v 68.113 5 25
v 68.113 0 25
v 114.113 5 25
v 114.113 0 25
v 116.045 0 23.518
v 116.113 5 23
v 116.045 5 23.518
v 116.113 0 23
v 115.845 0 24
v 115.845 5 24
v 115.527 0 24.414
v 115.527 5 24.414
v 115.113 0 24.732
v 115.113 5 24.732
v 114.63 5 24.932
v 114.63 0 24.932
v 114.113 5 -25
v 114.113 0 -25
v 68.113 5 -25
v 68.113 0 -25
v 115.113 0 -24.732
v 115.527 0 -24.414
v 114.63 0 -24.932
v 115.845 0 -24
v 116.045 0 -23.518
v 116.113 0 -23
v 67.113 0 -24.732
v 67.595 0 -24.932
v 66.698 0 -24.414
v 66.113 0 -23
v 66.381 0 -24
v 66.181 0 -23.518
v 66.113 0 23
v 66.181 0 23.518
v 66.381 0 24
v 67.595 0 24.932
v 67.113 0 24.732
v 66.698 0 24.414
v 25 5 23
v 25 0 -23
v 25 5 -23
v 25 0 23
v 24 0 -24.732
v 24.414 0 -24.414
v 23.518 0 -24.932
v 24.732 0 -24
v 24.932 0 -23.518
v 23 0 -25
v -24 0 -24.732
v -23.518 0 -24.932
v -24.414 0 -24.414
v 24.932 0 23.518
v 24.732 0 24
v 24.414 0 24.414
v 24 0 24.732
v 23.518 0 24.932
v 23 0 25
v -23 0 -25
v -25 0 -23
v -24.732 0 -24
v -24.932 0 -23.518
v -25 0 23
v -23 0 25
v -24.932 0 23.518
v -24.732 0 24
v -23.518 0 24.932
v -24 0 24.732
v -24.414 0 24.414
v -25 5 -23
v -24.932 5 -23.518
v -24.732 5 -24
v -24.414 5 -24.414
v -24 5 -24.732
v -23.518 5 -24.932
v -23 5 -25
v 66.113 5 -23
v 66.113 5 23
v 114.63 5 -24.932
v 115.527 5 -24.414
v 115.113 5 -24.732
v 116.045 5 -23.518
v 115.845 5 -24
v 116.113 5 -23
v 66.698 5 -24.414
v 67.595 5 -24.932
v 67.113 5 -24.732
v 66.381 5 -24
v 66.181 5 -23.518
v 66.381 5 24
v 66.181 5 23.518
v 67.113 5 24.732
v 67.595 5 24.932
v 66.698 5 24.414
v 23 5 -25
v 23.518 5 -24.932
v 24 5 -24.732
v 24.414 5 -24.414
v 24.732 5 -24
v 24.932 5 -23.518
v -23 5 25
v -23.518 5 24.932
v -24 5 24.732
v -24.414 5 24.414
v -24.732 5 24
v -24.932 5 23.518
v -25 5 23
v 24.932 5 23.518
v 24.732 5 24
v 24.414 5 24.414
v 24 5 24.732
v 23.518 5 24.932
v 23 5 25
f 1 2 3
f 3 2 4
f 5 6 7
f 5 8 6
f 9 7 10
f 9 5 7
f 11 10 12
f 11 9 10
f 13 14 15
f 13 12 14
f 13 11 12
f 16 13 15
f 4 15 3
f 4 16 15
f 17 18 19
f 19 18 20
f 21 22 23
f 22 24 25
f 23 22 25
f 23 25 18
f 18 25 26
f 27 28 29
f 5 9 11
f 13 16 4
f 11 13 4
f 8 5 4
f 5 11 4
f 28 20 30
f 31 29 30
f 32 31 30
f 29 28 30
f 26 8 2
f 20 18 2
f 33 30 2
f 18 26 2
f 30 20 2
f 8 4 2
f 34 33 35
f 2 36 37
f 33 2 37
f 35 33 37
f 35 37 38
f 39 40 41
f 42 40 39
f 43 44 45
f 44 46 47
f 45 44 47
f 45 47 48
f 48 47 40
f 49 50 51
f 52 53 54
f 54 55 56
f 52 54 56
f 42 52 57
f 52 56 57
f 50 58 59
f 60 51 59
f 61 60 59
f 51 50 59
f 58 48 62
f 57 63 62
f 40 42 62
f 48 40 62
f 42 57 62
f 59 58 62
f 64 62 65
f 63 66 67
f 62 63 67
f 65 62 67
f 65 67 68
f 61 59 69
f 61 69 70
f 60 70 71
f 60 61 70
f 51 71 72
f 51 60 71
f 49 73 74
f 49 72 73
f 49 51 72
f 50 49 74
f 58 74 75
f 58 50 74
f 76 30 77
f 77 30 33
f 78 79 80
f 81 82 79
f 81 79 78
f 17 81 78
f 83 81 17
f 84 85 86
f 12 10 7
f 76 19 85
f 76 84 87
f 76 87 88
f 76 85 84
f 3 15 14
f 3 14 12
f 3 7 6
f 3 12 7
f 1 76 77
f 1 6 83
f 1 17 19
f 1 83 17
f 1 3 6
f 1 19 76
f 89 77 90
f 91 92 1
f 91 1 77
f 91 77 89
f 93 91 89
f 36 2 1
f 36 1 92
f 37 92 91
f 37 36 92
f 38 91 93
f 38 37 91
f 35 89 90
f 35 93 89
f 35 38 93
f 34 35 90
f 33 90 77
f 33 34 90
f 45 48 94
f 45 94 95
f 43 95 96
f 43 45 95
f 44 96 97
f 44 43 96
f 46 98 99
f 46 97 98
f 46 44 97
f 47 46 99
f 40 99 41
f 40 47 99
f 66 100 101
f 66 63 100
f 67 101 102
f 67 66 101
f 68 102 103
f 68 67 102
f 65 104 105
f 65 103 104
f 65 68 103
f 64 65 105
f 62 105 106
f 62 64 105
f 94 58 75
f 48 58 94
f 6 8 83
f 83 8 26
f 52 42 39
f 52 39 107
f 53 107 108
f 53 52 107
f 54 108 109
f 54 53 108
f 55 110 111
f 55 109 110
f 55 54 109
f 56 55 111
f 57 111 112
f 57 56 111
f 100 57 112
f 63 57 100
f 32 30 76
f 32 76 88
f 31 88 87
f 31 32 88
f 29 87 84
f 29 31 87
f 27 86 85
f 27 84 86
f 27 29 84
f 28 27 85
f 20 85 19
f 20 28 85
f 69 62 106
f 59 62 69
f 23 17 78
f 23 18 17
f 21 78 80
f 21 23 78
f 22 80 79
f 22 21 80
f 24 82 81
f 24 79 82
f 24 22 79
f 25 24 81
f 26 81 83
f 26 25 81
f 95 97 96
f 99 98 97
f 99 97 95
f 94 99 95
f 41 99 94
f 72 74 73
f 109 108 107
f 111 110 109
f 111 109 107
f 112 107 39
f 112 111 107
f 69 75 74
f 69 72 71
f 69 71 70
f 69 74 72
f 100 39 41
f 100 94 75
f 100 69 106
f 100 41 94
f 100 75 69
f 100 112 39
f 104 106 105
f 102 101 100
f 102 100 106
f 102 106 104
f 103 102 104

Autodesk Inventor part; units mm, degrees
ref_plane "YZ Plane" through (0, 0, 0) normal (1, 0, 0) x (0, 1, 0)
ref_plane "XZ Plane" through (0, 0, 0) normal (0, 1, 0) x (-1, 0, 0)
ref_plane "XY Plane" through (0, 0, 0) normal (0, 0, 1) x (1, 0, 0)
sketch "Sketch1" plane through (0, 0, 0) normal (0, 1, 0) x (-1, 0, 0)
  line L0 (23, -25) -> (-23, -25)
  line L1 (-25, -23) -> (-25, 23)
  line L2 (-23, 25) -> (23, 25)
  line L3 (25, 23) -> (25, -23)
  line L4 (25, -25) -> (-25, 25) construction
  line L5 (-25, -25) -> (25, 25) construction
  line L6 (-114.1127, -25) -> (-68.1127, -25)
  line L7 (-66.1127, -23) -> (-66.1127, 23)
  line L8 (-68.1127, 25) -> (-114.1127, 25)
  line L9 (-116.1127, 23) -> (-116.1127, -23)
  line L10 (-116.1127, -25) -> (-66.1127, 25) construction
  line L11 (-66.1127, -25) -> (-116.1127, 25) construction
  arc A0 (-23, 25) -> (-25, 23) centre (-23, 23) ccw
  arc A1 (25, 23) -> (23, 25) centre (23, 23) ccw
  arc A2 (23, -25) -> (25, -23) centre (23, -23) ccw
  arc A3 (-25, -23) -> (-23, -25) centre (-23, -23) ccw
  arc A4 (-66.1127, 23) -> (-68.1127, 25) centre (-68.1127, 23) ccw
  arc A5 (-114.1127, 25) -> (-116.1127, 23) centre (-114.1127, 23) ccw
  arc A6 (-68.1127, -25) -> (-66.1127, -23) centre (-68.1127, -23) ccw
  arc A7 (-116.1127, -23) -> (-114.1127, -25) centre (-114.1127, -23) ccw
  point P0 (0, 0)
  point P1 (-91.1127, 0)
  dimension "d0" = 50
  dimension "d1" = 50
  dimension "d2" = 50
  dimension "d3" = 50
  dimension "d4" = 2
extrude "Extrusion1" add sketch "Sketch1" along normal blind 5
properties part number "spacer"
